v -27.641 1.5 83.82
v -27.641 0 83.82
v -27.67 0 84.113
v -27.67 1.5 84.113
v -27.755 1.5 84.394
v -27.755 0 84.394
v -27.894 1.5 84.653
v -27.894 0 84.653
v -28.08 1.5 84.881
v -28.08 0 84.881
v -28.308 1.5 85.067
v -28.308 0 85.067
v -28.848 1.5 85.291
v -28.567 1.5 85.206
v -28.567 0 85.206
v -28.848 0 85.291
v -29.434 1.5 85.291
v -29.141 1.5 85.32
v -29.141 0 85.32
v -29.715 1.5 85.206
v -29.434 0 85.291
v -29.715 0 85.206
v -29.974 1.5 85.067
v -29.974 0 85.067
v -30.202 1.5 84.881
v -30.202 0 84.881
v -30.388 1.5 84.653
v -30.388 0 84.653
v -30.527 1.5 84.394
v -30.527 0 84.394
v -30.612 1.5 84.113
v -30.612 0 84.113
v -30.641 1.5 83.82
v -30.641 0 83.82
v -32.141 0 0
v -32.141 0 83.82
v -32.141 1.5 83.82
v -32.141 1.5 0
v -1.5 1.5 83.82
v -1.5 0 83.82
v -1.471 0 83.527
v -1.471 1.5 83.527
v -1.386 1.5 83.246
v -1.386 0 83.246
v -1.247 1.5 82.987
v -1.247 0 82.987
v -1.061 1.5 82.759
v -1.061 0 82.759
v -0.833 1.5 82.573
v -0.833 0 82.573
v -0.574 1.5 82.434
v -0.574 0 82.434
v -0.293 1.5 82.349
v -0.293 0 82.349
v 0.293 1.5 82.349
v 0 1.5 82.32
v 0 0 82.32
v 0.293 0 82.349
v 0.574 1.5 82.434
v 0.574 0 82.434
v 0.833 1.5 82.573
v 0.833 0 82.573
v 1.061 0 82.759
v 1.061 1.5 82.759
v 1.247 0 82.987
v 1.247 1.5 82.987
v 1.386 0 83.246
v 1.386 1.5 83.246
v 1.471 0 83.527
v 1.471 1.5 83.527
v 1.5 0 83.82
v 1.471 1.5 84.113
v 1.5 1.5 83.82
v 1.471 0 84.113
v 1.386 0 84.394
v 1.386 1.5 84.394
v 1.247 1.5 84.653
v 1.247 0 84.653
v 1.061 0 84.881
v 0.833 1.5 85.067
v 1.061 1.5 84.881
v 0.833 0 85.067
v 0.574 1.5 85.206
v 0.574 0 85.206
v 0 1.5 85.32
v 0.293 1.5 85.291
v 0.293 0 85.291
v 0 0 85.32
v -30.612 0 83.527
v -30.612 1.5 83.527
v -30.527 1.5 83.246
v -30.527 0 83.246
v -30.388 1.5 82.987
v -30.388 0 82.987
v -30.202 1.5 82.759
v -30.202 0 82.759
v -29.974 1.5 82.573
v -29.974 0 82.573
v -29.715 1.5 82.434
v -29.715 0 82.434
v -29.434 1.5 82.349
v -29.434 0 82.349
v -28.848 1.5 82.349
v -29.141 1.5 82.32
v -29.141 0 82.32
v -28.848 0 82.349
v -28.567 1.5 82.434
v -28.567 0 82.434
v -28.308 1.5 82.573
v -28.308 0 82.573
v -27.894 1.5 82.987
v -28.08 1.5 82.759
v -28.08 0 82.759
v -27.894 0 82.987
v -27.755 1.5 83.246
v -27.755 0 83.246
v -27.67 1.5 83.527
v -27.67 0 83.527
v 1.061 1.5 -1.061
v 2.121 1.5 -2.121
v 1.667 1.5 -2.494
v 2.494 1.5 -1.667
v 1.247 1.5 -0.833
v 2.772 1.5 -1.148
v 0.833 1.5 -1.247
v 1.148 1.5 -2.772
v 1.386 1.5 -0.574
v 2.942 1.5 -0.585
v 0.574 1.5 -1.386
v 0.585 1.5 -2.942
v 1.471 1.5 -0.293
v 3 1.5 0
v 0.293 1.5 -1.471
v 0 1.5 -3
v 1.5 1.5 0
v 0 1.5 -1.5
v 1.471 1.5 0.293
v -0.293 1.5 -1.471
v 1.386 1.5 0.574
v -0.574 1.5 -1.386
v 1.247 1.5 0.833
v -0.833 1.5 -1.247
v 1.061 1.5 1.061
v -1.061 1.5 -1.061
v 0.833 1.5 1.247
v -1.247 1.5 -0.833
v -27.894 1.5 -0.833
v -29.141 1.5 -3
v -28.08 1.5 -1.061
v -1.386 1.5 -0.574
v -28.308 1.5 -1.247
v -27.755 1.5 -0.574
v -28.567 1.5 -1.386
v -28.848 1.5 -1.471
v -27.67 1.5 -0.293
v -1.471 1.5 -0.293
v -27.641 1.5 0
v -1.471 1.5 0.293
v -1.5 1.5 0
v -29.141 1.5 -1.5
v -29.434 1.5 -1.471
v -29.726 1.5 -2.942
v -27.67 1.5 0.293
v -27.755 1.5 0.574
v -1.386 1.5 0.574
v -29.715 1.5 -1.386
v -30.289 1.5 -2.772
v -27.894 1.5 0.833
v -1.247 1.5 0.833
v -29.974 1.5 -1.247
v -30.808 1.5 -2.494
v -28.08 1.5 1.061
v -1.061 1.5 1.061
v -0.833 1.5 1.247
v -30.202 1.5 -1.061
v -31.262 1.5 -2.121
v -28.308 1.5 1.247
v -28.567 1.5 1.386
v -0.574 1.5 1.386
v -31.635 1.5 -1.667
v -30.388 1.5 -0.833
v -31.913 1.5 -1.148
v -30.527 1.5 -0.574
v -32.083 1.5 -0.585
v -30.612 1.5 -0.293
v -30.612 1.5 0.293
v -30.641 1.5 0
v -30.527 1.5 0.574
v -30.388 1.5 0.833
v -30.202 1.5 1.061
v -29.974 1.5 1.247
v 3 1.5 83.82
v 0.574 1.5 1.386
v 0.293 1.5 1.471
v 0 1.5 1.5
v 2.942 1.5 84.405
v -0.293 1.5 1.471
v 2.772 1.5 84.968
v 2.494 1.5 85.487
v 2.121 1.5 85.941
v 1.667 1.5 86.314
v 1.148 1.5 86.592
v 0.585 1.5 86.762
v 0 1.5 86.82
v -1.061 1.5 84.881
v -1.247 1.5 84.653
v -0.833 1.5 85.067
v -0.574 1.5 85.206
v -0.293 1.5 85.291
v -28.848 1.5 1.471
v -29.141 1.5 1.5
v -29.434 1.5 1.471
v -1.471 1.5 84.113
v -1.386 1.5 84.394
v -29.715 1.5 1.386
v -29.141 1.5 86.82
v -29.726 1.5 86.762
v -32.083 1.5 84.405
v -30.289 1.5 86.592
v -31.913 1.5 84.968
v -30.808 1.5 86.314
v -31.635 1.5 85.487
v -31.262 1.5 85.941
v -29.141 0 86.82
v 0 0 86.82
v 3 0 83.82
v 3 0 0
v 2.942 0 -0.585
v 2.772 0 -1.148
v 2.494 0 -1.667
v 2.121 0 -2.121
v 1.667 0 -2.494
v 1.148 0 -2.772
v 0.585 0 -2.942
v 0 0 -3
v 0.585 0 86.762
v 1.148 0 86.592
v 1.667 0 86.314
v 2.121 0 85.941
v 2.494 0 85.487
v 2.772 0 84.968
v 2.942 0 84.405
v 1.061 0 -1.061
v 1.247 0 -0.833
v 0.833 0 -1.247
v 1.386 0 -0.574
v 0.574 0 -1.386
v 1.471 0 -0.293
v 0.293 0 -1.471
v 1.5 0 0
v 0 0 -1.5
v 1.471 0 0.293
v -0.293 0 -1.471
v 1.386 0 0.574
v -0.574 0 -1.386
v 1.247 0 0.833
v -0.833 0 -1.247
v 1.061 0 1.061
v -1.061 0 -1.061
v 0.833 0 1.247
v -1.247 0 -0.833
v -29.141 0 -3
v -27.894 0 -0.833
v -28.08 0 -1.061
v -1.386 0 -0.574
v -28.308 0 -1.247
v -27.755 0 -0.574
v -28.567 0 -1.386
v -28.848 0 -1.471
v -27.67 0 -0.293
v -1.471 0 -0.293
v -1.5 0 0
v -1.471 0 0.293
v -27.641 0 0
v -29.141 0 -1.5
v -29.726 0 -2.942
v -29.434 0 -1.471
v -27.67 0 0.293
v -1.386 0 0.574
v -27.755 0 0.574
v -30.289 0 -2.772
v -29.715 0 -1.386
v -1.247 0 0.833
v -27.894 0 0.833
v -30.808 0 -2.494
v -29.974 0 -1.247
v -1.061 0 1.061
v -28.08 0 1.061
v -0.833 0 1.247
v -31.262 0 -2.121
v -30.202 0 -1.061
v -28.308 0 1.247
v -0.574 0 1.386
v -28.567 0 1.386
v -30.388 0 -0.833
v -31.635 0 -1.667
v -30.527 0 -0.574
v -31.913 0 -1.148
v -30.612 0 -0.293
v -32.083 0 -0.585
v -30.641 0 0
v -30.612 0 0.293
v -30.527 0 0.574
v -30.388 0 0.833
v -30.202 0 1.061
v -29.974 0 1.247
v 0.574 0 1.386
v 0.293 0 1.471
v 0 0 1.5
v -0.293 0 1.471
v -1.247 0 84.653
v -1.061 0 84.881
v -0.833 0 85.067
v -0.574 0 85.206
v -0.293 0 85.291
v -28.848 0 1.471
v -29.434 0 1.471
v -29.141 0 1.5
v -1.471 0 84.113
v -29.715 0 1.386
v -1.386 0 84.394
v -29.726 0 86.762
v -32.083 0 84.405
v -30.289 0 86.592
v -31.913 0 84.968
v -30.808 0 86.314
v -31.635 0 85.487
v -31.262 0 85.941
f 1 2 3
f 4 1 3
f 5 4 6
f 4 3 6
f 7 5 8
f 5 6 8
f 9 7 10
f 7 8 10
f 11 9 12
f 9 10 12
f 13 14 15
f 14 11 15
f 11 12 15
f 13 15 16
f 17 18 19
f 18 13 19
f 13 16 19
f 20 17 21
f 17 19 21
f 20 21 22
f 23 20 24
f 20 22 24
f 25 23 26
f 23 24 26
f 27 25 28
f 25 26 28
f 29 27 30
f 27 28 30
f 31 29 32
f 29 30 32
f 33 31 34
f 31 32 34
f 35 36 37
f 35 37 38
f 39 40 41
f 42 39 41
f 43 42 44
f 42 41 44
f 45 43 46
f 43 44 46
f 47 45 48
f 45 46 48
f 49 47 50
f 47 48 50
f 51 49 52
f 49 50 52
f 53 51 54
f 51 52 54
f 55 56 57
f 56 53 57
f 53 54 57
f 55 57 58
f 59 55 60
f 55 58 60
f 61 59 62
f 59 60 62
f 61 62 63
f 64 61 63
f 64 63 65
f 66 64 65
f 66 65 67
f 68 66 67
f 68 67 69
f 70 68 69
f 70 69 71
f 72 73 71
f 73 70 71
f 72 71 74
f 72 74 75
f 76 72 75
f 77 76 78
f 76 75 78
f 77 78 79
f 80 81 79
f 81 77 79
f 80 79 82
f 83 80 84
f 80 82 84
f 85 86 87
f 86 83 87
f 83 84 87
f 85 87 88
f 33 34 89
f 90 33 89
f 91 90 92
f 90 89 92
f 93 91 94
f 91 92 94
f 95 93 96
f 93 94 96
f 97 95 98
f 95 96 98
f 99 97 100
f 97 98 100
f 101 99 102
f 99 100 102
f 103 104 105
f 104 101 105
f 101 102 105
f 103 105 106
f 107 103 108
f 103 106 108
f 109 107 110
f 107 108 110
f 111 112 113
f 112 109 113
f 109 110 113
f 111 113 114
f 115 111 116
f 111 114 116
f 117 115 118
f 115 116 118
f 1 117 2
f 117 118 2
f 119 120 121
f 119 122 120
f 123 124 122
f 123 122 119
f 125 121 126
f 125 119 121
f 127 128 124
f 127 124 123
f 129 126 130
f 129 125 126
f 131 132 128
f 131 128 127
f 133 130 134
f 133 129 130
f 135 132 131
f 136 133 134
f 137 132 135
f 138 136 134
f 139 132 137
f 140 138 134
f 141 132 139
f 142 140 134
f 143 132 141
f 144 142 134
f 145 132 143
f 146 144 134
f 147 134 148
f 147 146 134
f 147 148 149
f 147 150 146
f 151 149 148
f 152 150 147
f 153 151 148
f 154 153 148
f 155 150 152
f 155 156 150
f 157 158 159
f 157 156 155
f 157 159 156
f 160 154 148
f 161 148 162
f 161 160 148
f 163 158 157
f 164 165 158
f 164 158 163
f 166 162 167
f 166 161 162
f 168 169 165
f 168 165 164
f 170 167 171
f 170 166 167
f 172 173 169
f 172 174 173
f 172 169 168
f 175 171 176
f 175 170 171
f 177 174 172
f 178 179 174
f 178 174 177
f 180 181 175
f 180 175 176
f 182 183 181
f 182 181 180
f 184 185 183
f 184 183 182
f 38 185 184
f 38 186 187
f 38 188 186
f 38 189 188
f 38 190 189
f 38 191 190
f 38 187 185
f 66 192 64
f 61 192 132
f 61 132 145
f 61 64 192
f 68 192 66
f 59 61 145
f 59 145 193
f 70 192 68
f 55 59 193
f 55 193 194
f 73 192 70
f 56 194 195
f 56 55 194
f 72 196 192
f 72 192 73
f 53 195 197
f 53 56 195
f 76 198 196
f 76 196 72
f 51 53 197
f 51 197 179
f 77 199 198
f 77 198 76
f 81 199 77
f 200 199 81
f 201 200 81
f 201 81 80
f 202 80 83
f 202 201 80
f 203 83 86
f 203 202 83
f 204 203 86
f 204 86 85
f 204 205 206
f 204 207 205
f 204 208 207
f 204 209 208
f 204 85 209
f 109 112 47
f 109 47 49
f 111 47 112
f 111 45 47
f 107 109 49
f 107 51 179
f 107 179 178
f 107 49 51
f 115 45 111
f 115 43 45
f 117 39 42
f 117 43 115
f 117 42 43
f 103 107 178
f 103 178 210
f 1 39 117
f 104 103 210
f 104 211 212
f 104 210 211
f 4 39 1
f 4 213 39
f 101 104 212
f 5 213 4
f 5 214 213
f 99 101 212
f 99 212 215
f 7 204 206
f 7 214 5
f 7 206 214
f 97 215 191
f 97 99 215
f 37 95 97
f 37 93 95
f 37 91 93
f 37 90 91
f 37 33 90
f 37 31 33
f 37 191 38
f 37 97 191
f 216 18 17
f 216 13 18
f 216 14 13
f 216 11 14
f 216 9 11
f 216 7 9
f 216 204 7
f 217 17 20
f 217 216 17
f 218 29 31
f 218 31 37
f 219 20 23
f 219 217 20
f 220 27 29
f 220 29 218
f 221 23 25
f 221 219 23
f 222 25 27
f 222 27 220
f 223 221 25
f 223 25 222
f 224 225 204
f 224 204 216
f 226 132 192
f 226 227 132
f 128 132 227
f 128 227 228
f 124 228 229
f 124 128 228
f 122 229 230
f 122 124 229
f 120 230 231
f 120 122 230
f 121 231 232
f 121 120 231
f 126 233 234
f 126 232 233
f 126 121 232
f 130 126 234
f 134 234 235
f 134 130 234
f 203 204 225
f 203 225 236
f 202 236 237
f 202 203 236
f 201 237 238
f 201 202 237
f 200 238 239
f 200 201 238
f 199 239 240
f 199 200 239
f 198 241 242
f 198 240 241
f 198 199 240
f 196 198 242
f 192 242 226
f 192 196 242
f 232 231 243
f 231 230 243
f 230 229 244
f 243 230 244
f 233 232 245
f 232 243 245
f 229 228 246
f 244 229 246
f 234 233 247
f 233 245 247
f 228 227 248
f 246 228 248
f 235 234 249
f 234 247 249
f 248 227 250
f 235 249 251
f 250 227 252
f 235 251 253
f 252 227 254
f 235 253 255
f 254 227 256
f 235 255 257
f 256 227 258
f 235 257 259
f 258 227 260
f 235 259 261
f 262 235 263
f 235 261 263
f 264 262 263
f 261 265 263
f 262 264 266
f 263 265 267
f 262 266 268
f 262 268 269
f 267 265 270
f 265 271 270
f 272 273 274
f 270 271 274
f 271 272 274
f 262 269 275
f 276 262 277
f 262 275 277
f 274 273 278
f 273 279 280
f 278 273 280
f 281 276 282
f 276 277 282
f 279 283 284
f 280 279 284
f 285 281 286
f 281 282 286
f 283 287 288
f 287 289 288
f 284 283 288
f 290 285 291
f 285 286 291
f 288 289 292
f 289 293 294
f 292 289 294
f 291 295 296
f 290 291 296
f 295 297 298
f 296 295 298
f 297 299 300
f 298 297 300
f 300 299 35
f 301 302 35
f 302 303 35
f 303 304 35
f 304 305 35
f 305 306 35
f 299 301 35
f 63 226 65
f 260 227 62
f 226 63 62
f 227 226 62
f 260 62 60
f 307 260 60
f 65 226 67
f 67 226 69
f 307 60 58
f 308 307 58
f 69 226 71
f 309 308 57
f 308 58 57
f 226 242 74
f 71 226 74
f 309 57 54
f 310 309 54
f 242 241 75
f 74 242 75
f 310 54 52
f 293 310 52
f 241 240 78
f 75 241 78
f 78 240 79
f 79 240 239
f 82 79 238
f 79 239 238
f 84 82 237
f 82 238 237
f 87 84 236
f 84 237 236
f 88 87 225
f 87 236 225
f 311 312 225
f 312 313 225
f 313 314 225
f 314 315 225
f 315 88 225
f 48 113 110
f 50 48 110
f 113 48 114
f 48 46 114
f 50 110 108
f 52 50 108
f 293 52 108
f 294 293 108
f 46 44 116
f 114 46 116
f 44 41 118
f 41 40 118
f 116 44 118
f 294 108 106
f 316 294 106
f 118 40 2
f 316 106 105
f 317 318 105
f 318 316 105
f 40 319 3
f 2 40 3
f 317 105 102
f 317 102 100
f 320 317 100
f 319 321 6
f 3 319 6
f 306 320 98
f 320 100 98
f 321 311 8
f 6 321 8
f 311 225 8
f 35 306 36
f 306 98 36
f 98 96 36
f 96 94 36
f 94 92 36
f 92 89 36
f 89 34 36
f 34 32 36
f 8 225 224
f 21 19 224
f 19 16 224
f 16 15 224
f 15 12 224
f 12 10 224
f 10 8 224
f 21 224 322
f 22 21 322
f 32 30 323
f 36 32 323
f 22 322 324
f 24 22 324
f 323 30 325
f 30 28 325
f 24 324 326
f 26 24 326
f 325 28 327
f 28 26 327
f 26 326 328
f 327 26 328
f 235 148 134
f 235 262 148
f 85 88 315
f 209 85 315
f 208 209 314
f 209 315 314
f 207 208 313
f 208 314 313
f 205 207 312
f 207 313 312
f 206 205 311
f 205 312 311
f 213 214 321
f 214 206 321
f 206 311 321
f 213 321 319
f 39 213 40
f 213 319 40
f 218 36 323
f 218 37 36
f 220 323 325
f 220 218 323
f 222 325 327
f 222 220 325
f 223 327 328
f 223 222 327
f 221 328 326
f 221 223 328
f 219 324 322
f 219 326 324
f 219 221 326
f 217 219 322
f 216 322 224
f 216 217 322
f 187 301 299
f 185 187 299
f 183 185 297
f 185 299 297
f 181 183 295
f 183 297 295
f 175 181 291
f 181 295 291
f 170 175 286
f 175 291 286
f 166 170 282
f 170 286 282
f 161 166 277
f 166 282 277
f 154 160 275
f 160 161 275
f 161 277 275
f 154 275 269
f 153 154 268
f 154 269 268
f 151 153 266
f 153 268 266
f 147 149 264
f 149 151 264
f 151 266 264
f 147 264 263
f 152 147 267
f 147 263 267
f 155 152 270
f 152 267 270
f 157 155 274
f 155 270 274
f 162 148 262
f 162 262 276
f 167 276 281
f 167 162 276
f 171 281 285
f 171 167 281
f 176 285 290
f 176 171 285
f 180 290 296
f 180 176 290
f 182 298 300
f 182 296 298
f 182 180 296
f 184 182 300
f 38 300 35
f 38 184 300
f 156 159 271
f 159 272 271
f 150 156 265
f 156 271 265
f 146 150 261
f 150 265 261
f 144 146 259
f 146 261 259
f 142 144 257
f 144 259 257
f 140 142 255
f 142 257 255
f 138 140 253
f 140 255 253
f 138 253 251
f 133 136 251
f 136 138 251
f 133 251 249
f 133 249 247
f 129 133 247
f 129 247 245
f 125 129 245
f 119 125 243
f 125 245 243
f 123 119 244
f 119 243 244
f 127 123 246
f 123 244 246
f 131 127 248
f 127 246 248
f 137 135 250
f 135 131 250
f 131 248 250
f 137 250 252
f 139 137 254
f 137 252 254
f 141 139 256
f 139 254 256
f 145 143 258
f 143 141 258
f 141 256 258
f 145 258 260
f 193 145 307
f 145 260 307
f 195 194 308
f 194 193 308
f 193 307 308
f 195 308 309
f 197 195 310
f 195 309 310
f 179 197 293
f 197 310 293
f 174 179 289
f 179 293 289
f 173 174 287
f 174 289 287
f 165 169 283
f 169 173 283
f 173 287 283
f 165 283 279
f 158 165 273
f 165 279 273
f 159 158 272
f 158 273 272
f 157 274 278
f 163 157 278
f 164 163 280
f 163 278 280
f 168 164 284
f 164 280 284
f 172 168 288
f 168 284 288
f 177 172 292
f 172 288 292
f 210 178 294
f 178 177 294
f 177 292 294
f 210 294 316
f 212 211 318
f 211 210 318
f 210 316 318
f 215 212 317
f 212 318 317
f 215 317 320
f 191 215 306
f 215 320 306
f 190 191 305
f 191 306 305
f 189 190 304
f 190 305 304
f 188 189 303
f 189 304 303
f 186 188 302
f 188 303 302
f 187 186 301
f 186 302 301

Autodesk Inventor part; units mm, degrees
ref_plane "YZ Plane" through (0, 0, 0) normal (1, 0, 0) x (0, 1, 0)
ref_plane "XZ Plane" through (0, 0, 0) normal (0, 1, 0) x (-1, 0, 0)
ref_plane "XY Plane" through (0, 0, 0) normal (0, 0, 1) x (1, 0, 0)
sketch "Sketch1" plane through (0, 0, 0) normal (0, 1, 0) x (-1, 0, 0)
  line L0 (0, 0) -> (29.141, 0)
  line L1 (29.141, 83.82) -> (0, 83.82)
  line L2 (0, 83.82) -> (0, 86.82)
  line L3 (0, 86.82) -> (-3, 86.82)
  line L4 (-3, 86.82) -> (32.141, 86.82)
  line L5 (32.141, 86.82) -> (32.141, -3)
  line L6 (32.141, -3) -> (-3, -3)
  line L7 (-3, -3) -> (-3, 86.82)
  circle A0 centre (0, 83.82) radius 1.5
  circle A1 centre (29.141, 83.82) radius 1.5
  circle A2 centre (0, 0) radius 1.5
  circle A3 centre (29.141, 0) radius 1.5
  dimension "d0" = 29.141
  dimension "d1" = 83.82
  dimension "d2" = 3
  dimension "d3" = 3
  dimension "d4" = 35.141
  dimension "d5" = 89.82
  dimension "d6" = 3
  dimension "d7" = 3
  dimension "d8" = 3
  dimension "d9" = 3
extrude "Extrusion1" add sketch "Sketch1" along normal blind 1.5
fillet "Fillet1" radius 3 4 edges at (-32.141, 0.75, 86.82) (3, 0.75, 86.82) (3, 0.75, -3) (-32.141, 0.75, -3)
properties part number "Power Supply"
